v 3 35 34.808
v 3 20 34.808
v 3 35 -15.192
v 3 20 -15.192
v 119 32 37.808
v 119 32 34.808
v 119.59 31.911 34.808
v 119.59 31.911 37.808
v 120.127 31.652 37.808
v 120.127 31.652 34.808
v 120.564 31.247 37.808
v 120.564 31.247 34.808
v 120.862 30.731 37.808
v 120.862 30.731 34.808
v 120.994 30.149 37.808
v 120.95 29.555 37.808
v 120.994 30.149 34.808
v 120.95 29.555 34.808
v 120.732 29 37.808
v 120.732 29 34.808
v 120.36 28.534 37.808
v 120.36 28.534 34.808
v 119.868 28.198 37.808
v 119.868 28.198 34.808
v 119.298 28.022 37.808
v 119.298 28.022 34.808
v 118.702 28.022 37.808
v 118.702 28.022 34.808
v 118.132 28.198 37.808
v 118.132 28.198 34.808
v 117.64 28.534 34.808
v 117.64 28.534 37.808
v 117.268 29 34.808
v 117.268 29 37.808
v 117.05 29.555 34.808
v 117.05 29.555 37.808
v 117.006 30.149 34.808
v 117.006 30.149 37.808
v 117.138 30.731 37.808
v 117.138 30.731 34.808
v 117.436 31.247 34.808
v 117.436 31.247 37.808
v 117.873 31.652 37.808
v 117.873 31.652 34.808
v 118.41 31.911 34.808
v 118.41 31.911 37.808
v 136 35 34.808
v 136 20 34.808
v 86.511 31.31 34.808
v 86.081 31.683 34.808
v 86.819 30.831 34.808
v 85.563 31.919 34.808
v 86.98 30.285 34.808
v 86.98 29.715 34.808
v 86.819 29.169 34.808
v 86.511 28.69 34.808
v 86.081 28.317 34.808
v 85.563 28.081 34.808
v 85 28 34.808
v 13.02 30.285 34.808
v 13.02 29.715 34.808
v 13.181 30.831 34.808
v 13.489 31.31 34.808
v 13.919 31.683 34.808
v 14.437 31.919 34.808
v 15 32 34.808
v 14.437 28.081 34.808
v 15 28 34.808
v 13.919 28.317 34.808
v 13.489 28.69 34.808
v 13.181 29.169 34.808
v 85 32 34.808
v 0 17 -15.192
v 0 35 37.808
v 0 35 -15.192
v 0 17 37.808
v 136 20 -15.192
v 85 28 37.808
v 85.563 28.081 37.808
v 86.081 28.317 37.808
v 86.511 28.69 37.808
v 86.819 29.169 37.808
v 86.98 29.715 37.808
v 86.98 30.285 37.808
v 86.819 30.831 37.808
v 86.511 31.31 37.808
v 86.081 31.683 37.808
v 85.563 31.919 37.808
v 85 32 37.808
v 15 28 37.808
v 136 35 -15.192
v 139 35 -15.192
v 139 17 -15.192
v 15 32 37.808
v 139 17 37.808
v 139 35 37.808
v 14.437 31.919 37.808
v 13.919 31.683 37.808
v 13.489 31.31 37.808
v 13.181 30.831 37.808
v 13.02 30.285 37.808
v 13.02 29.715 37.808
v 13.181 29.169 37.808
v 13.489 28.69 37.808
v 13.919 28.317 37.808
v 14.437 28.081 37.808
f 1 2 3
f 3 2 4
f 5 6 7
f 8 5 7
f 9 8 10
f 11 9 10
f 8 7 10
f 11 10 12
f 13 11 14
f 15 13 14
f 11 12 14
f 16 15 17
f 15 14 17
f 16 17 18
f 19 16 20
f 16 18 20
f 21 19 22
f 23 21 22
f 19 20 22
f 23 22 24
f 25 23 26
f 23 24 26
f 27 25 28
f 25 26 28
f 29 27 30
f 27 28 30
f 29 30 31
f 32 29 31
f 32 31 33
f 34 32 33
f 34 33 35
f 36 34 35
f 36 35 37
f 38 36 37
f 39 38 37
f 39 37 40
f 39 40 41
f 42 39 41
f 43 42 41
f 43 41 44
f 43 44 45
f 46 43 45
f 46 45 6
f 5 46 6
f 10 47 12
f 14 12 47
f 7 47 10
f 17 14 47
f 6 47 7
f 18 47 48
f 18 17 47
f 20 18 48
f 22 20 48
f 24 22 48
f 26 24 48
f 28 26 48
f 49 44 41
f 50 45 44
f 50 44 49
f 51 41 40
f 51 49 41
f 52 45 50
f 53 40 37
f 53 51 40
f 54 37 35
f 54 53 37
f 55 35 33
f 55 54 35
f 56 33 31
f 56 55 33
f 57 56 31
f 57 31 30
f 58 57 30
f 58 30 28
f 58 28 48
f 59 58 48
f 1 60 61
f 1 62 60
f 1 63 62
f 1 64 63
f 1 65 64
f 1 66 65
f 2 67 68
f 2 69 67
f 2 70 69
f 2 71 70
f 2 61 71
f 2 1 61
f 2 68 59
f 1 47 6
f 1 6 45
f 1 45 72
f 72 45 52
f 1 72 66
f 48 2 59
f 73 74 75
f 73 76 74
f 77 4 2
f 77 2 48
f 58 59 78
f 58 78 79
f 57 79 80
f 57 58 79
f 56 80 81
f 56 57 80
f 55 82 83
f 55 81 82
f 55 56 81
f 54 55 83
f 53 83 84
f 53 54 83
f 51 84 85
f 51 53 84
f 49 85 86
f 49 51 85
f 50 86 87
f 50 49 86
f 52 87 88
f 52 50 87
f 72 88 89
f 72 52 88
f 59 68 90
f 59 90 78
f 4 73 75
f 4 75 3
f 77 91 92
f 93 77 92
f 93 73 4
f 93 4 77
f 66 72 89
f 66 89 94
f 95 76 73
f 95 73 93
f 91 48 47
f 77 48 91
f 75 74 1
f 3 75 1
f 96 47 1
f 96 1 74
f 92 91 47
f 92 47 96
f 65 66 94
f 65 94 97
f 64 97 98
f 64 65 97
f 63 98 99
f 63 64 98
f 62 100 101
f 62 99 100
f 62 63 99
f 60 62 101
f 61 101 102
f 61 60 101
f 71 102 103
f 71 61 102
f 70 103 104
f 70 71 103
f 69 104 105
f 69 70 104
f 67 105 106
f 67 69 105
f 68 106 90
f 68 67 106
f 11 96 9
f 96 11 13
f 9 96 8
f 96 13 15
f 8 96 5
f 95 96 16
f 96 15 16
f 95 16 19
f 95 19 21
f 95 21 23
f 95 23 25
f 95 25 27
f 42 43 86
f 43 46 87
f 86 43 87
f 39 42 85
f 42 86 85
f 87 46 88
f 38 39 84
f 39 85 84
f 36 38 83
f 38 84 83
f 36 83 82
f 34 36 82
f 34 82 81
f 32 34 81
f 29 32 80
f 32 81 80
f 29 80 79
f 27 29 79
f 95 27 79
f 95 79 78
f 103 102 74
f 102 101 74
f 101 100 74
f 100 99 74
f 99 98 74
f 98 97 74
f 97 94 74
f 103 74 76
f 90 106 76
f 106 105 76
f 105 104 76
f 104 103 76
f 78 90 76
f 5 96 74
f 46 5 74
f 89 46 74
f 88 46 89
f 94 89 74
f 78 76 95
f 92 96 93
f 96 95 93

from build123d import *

# Parameters (mm, degrees)
BOSS_EXTRUDE1_DEPTH = 139
SKETCH5_R           = 2
CUT_EXTRUDE1_DEPTH  = 148.549991528
SKETCH6_W           = 3
SKETCH6_H           = 35
BOSS_EXTRUDE2_DEPTH = 35
SKETCH7_W           = 133
SKETCH7_H           = 35
BOSS_EXTRUDE3_DEPTH = 5
SKETCH8_W           = 133
SKETCH8_H           = 35
CUT_EXTRUDE2_DEPTH  = 20
SKETCH9_W           = 3
SKETCH9_H           = 12
BOSS_EXTRUDE4_DEPTH = 25
SKETCH10_W          = 133
SKETCH10_H          = 50
BOSS_EXTRUDE5_DEPTH = 20
SKETCH11_W          = 139
SKETCH11_H          = 53
CUT_EXTRUDE3_DEPTH  = 20


with BuildPart() as part:
    # Sketch3 → Boss-Extrude1 (new body)
    with BuildSketch(Plane(origin=(0, 0, 0), x_dir=(0, 0, -1), z_dir=(1, 0, 0))):
        Polygon((-34.8080918, 35), (-34.8080918, 10), (-22.8080918, 10), (-22.8080918, 35), (-19.8080918, 35), (-19.8080918, 0), (15.1919082, 0), (15.1919082, -3), (-29.8080918, -3), (-37.8080918, -3), (-37.8080918, 0), (-37.8080918, 35), align=None)
    extrude(amount=BOSS_EXTRUDE1_DEPTH)

    # Sketch5 → Cut-Extrude1 (cut, through all)
    with BuildSketch(Plane(origin=(0, 0, 19.8080918), x_dir=(-1, 0, 0), z_dir=(0, 0, -1))):
        with Locations(Location((-119, 30, 0), (0, 0, 90))):
            Circle(SKETCH5_R)
        with BuildLine():
            Line((-85, 32), (-15, 32))
            ThreePointArc((-15, 32), (-13, 30), (-15, 28))
            Line((-15, 28), (-85, 28))
            ThreePointArc((-85, 28), (-87, 30), (-85, 32))
        make_face()
    extrude(amount=-CUT_EXTRUDE1_DEPTH, mode=Mode.SUBTRACT)

    # Sketch6 → Boss-Extrude2 (add)
    with BuildSketch(Plane(origin=(0, 0, 0), x_dir=(1, 0, 0), z_dir=(0, 1, 0))):
        with Locations((1.5, -2.3080918)):
            Rectangle(SKETCH6_W, SKETCH6_H)
        with Locations((137.5, -2.3080918)):
            Rectangle(SKETCH6_W, SKETCH6_H)
    extrude(amount=BOSS_EXTRUDE2_DEPTH)

    # Sketch7 → Boss-Extrude3 (add)
    with BuildSketch(Plane(origin=(0, 0, 19.8080918), x_dir=(-1, 0, 0), z_dir=(0, 0, -1))):
        with Locations((-69.5, 17.5)):
            Rectangle(SKETCH7_W, SKETCH7_H)
    extrude(amount=BOSS_EXTRUDE3_DEPTH)

    # Sketch8 → Cut-Extrude2 (cut)
    with BuildSketch(Plane(origin=(0, 0, 14.8080918), x_dir=(-1, 0, 0), z_dir=(0, 0, -1))):
        with Locations((-69.5, 17.5)):
            Rectangle(SKETCH8_W, SKETCH8_H)
    extrude(amount=-CUT_EXTRUDE2_DEPTH, mode=Mode.SUBTRACT)

    # Sketch9 → Boss-Extrude4 (add)
    with BuildSketch(Plane(origin=(0, 10, 0), x_dir=(1, 0, 0), z_dir=(0, 1, 0))):
        with Locations((137.5, -28.8080918)):
            Rectangle(SKETCH9_W, SKETCH9_H)
        with Locations((1.5, -28.8080918)):
            Rectangle(SKETCH9_W, SKETCH9_H)
    extrude(amount=BOSS_EXTRUDE4_DEPTH)

    # Sketch10 → Boss-Extrude5 (add)
    with BuildSketch(Plane(origin=(0, 0, 0), x_dir=(1, 0, 0), z_dir=(0, 1, 0))):
        with Locations((69.5, -9.8080918)):
            Rectangle(SKETCH10_W, SKETCH10_H)
    extrude(amount=BOSS_EXTRUDE5_DEPTH)

    # Sketch11 → Cut-Extrude3 (cut)
    with BuildSketch(Plane.XZ.offset(3)):
        with Locations((69.5, 11.3080918)):
            Rectangle(SKETCH11_W, SKETCH11_H)
    extrude(amount=-CUT_EXTRUDE3_DEPTH, mode=Mode.SUBTRACT)


solid = part.part
